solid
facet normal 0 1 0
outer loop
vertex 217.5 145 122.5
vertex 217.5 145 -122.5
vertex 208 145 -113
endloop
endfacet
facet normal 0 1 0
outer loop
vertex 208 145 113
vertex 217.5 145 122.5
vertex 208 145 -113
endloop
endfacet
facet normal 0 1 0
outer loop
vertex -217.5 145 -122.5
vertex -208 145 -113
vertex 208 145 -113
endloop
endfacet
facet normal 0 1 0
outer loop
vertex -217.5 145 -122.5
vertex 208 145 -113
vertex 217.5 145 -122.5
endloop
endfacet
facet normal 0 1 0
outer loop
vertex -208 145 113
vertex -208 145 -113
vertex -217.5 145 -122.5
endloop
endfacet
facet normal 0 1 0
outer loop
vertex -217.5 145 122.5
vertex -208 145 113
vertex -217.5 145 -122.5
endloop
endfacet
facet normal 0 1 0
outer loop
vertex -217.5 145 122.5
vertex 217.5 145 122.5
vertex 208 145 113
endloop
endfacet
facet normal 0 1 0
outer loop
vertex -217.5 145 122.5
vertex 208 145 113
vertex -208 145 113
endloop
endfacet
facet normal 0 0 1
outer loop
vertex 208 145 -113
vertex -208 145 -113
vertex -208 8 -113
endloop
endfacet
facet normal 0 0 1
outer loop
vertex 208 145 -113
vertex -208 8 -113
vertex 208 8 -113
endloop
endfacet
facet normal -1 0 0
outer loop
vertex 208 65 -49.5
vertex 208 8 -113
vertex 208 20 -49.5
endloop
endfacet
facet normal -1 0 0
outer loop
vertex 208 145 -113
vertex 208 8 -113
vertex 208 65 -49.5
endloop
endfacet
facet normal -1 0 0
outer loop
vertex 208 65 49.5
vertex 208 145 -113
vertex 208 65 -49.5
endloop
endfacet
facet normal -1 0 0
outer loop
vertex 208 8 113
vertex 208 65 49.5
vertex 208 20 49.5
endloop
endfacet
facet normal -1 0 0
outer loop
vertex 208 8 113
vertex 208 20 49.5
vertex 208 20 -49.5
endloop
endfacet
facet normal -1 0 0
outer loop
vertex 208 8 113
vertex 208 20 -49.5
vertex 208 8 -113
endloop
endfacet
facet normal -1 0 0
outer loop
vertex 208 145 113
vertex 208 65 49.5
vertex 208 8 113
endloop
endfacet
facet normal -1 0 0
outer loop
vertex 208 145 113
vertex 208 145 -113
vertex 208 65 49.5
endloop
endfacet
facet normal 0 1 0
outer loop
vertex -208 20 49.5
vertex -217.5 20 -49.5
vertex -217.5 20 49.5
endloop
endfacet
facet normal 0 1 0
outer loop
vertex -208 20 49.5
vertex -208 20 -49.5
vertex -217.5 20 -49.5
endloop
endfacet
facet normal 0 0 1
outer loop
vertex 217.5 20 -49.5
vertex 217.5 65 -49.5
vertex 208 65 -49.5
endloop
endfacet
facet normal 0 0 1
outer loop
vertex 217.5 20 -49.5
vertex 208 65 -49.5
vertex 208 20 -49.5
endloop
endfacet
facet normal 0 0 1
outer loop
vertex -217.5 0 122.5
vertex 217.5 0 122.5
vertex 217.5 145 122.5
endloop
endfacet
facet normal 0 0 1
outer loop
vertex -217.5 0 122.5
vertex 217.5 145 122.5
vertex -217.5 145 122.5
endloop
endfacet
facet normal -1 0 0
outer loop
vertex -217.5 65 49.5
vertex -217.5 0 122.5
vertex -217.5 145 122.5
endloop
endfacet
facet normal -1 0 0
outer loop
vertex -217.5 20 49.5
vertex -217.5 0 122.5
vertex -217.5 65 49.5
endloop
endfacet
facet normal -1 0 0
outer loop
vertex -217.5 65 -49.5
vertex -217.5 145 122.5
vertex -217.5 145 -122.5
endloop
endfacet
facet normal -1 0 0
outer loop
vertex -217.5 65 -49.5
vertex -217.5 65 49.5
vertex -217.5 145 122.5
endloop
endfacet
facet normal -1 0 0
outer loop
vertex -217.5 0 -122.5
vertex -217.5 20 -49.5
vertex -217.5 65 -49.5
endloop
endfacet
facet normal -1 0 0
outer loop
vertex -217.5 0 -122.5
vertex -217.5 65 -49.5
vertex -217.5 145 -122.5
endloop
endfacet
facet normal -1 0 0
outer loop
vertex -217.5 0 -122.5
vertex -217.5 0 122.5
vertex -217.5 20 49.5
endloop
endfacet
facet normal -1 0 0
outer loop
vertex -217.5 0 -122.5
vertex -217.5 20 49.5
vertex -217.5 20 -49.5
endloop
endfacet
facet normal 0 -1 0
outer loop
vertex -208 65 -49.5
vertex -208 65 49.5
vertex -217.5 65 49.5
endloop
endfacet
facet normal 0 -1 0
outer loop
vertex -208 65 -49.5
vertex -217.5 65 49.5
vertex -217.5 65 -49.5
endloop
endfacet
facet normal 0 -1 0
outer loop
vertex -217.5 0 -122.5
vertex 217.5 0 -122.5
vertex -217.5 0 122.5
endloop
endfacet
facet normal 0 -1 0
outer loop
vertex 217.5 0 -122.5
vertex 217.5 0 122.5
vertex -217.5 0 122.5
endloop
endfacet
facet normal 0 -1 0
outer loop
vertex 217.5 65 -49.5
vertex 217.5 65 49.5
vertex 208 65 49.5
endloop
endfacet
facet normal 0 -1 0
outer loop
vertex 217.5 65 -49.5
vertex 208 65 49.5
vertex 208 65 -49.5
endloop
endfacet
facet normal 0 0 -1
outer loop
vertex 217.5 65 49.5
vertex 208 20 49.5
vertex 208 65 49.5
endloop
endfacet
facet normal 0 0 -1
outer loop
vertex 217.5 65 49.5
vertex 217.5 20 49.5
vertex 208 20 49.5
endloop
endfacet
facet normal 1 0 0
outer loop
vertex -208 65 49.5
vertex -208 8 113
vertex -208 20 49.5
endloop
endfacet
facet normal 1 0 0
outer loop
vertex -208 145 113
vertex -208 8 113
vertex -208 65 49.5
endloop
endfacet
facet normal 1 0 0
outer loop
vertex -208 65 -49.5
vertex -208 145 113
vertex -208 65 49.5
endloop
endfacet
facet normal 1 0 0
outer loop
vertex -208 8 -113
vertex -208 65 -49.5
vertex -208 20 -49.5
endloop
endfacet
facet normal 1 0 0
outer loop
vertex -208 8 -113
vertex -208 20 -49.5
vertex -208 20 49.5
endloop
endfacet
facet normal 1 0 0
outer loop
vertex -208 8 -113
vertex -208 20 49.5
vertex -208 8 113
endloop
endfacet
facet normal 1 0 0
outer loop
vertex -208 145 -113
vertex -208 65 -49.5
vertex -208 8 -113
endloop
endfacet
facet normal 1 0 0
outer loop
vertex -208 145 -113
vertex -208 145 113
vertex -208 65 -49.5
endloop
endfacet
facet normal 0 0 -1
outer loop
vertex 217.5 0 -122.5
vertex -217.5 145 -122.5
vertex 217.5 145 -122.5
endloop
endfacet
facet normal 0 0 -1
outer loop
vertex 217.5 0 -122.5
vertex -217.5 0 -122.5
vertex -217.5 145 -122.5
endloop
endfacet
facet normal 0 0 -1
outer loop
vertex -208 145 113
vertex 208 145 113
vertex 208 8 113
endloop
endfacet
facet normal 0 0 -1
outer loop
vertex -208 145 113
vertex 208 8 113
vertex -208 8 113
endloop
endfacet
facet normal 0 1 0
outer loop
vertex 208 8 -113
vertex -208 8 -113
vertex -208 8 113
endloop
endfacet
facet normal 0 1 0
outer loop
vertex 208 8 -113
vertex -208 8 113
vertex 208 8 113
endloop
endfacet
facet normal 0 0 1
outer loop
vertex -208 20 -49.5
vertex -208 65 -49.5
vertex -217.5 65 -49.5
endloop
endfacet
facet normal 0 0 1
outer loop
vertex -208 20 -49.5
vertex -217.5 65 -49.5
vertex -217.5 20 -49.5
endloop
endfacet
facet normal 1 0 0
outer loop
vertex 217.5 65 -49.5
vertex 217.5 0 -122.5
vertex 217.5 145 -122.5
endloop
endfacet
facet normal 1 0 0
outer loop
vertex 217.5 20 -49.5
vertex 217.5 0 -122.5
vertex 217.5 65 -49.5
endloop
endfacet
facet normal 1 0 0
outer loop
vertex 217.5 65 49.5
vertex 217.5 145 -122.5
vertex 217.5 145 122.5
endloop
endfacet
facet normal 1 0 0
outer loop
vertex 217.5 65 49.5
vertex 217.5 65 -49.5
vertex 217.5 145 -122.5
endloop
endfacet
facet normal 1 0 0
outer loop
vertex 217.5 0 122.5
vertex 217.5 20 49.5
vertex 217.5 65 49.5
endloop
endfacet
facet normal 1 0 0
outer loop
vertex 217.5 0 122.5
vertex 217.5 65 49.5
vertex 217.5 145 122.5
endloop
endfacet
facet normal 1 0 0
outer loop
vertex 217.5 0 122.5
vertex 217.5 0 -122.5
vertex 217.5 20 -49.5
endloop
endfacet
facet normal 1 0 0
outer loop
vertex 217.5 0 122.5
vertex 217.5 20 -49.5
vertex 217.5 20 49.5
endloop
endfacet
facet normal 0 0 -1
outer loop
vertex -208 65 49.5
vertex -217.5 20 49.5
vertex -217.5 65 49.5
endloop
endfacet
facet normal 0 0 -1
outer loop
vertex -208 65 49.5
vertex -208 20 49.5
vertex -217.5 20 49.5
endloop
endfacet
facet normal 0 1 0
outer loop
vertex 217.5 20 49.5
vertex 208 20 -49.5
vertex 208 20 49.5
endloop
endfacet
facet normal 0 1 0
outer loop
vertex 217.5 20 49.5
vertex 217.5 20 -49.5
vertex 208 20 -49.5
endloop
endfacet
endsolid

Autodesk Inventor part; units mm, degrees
ref_plane "YZ Plane" through (0, 0, 0) normal (1, 0, 0) x (0, 1, 0)
ref_plane "XZ Plane" through (0, 0, 0) normal (0, 1, 0) x (-1, 0, 0)
ref_plane "XY Plane" through (0, 0, 0) normal (0, 0, 1) x (1, 0, 0)
sketch "Sketch1" plane through (0, 0, 0) normal (0, 1, 0) x (-1, 0, 0)
  line L0 (217.5, -122.5) -> (-217.5, -122.5)
  line L1 (-217.5, -122.5) -> (-217.5, 122.5)
  line L2 (-217.5, 122.5) -> (217.5, 122.5)
  line L3 (217.5, 122.5) -> (217.5, -122.5)
  line L4 (217.5, -122.5) -> (-217.5, 122.5) construction
  line L5 (-217.5, -122.5) -> (217.5, 122.5) construction
  point P0 (0, 0)
  dimension "d0" = 435
  dimension "d1" = 245
extrude "Extrusion1" add sketch "Sketch1" along normal blind 145
sketch "Sketch3" plane through (217.5, 0, 122.5) normal (1, 0, 0) x (0, 0, -1)
  line L0 (73, 65) -> (172, 65)
  line L1 (172, 65) -> (172, 20)
  line L2 (172, 20) -> (73, 20)
  line L3 (73, 20) -> (73, 65)
  line L4 (245, 0) -> (245, 145) projected
  line L5 (0, 145) -> (245, 145) projected
  line L6 (0, 5) -> (240, 5) projected
  point P0 (122.5, 0)
  point P1 (172, 42.5)
  dimension "d12" = 73
  dimension "d13" = 80
  dimension "d14" = 99
  dimension "d16" = 45
extrude "Extrusion3" cut sketch "Sketch3" against normal blind 450
sketch "Sketch4" plane through (0, 145, 0) normal (0, 1, 0) x (1, 0, 0)
  line L0 (-208, 113) -> (208, 113)
  line L1 (208, 113) -> (208, -113)
  line L2 (208, -113) -> (-208, -113)
  line L3 (-208, -113) -> (-208, 113)
  line L4 (217.5, 122.5) -> (-217.5, 122.5) projected
  line L5 (217.5, -122.5) -> (217.5, 122.5) projected
  line L6 (-217.5, -122.5) -> (217.5, -122.5) projected
  line L7 (-217.5, 122.5) -> (-217.5, -122.5) projected
  point P0 (0, 0)
  dimension "d19" = 9.5
  dimension "d20" = 9.5
  dimension "d21" = 9.5
  dimension "d22" = 9.5
extrude "Extrusion4" cut sketch "Sketch4" against normal blind 137 contours L0 L1 L2 L3
properties part number "Kenyertarto"
